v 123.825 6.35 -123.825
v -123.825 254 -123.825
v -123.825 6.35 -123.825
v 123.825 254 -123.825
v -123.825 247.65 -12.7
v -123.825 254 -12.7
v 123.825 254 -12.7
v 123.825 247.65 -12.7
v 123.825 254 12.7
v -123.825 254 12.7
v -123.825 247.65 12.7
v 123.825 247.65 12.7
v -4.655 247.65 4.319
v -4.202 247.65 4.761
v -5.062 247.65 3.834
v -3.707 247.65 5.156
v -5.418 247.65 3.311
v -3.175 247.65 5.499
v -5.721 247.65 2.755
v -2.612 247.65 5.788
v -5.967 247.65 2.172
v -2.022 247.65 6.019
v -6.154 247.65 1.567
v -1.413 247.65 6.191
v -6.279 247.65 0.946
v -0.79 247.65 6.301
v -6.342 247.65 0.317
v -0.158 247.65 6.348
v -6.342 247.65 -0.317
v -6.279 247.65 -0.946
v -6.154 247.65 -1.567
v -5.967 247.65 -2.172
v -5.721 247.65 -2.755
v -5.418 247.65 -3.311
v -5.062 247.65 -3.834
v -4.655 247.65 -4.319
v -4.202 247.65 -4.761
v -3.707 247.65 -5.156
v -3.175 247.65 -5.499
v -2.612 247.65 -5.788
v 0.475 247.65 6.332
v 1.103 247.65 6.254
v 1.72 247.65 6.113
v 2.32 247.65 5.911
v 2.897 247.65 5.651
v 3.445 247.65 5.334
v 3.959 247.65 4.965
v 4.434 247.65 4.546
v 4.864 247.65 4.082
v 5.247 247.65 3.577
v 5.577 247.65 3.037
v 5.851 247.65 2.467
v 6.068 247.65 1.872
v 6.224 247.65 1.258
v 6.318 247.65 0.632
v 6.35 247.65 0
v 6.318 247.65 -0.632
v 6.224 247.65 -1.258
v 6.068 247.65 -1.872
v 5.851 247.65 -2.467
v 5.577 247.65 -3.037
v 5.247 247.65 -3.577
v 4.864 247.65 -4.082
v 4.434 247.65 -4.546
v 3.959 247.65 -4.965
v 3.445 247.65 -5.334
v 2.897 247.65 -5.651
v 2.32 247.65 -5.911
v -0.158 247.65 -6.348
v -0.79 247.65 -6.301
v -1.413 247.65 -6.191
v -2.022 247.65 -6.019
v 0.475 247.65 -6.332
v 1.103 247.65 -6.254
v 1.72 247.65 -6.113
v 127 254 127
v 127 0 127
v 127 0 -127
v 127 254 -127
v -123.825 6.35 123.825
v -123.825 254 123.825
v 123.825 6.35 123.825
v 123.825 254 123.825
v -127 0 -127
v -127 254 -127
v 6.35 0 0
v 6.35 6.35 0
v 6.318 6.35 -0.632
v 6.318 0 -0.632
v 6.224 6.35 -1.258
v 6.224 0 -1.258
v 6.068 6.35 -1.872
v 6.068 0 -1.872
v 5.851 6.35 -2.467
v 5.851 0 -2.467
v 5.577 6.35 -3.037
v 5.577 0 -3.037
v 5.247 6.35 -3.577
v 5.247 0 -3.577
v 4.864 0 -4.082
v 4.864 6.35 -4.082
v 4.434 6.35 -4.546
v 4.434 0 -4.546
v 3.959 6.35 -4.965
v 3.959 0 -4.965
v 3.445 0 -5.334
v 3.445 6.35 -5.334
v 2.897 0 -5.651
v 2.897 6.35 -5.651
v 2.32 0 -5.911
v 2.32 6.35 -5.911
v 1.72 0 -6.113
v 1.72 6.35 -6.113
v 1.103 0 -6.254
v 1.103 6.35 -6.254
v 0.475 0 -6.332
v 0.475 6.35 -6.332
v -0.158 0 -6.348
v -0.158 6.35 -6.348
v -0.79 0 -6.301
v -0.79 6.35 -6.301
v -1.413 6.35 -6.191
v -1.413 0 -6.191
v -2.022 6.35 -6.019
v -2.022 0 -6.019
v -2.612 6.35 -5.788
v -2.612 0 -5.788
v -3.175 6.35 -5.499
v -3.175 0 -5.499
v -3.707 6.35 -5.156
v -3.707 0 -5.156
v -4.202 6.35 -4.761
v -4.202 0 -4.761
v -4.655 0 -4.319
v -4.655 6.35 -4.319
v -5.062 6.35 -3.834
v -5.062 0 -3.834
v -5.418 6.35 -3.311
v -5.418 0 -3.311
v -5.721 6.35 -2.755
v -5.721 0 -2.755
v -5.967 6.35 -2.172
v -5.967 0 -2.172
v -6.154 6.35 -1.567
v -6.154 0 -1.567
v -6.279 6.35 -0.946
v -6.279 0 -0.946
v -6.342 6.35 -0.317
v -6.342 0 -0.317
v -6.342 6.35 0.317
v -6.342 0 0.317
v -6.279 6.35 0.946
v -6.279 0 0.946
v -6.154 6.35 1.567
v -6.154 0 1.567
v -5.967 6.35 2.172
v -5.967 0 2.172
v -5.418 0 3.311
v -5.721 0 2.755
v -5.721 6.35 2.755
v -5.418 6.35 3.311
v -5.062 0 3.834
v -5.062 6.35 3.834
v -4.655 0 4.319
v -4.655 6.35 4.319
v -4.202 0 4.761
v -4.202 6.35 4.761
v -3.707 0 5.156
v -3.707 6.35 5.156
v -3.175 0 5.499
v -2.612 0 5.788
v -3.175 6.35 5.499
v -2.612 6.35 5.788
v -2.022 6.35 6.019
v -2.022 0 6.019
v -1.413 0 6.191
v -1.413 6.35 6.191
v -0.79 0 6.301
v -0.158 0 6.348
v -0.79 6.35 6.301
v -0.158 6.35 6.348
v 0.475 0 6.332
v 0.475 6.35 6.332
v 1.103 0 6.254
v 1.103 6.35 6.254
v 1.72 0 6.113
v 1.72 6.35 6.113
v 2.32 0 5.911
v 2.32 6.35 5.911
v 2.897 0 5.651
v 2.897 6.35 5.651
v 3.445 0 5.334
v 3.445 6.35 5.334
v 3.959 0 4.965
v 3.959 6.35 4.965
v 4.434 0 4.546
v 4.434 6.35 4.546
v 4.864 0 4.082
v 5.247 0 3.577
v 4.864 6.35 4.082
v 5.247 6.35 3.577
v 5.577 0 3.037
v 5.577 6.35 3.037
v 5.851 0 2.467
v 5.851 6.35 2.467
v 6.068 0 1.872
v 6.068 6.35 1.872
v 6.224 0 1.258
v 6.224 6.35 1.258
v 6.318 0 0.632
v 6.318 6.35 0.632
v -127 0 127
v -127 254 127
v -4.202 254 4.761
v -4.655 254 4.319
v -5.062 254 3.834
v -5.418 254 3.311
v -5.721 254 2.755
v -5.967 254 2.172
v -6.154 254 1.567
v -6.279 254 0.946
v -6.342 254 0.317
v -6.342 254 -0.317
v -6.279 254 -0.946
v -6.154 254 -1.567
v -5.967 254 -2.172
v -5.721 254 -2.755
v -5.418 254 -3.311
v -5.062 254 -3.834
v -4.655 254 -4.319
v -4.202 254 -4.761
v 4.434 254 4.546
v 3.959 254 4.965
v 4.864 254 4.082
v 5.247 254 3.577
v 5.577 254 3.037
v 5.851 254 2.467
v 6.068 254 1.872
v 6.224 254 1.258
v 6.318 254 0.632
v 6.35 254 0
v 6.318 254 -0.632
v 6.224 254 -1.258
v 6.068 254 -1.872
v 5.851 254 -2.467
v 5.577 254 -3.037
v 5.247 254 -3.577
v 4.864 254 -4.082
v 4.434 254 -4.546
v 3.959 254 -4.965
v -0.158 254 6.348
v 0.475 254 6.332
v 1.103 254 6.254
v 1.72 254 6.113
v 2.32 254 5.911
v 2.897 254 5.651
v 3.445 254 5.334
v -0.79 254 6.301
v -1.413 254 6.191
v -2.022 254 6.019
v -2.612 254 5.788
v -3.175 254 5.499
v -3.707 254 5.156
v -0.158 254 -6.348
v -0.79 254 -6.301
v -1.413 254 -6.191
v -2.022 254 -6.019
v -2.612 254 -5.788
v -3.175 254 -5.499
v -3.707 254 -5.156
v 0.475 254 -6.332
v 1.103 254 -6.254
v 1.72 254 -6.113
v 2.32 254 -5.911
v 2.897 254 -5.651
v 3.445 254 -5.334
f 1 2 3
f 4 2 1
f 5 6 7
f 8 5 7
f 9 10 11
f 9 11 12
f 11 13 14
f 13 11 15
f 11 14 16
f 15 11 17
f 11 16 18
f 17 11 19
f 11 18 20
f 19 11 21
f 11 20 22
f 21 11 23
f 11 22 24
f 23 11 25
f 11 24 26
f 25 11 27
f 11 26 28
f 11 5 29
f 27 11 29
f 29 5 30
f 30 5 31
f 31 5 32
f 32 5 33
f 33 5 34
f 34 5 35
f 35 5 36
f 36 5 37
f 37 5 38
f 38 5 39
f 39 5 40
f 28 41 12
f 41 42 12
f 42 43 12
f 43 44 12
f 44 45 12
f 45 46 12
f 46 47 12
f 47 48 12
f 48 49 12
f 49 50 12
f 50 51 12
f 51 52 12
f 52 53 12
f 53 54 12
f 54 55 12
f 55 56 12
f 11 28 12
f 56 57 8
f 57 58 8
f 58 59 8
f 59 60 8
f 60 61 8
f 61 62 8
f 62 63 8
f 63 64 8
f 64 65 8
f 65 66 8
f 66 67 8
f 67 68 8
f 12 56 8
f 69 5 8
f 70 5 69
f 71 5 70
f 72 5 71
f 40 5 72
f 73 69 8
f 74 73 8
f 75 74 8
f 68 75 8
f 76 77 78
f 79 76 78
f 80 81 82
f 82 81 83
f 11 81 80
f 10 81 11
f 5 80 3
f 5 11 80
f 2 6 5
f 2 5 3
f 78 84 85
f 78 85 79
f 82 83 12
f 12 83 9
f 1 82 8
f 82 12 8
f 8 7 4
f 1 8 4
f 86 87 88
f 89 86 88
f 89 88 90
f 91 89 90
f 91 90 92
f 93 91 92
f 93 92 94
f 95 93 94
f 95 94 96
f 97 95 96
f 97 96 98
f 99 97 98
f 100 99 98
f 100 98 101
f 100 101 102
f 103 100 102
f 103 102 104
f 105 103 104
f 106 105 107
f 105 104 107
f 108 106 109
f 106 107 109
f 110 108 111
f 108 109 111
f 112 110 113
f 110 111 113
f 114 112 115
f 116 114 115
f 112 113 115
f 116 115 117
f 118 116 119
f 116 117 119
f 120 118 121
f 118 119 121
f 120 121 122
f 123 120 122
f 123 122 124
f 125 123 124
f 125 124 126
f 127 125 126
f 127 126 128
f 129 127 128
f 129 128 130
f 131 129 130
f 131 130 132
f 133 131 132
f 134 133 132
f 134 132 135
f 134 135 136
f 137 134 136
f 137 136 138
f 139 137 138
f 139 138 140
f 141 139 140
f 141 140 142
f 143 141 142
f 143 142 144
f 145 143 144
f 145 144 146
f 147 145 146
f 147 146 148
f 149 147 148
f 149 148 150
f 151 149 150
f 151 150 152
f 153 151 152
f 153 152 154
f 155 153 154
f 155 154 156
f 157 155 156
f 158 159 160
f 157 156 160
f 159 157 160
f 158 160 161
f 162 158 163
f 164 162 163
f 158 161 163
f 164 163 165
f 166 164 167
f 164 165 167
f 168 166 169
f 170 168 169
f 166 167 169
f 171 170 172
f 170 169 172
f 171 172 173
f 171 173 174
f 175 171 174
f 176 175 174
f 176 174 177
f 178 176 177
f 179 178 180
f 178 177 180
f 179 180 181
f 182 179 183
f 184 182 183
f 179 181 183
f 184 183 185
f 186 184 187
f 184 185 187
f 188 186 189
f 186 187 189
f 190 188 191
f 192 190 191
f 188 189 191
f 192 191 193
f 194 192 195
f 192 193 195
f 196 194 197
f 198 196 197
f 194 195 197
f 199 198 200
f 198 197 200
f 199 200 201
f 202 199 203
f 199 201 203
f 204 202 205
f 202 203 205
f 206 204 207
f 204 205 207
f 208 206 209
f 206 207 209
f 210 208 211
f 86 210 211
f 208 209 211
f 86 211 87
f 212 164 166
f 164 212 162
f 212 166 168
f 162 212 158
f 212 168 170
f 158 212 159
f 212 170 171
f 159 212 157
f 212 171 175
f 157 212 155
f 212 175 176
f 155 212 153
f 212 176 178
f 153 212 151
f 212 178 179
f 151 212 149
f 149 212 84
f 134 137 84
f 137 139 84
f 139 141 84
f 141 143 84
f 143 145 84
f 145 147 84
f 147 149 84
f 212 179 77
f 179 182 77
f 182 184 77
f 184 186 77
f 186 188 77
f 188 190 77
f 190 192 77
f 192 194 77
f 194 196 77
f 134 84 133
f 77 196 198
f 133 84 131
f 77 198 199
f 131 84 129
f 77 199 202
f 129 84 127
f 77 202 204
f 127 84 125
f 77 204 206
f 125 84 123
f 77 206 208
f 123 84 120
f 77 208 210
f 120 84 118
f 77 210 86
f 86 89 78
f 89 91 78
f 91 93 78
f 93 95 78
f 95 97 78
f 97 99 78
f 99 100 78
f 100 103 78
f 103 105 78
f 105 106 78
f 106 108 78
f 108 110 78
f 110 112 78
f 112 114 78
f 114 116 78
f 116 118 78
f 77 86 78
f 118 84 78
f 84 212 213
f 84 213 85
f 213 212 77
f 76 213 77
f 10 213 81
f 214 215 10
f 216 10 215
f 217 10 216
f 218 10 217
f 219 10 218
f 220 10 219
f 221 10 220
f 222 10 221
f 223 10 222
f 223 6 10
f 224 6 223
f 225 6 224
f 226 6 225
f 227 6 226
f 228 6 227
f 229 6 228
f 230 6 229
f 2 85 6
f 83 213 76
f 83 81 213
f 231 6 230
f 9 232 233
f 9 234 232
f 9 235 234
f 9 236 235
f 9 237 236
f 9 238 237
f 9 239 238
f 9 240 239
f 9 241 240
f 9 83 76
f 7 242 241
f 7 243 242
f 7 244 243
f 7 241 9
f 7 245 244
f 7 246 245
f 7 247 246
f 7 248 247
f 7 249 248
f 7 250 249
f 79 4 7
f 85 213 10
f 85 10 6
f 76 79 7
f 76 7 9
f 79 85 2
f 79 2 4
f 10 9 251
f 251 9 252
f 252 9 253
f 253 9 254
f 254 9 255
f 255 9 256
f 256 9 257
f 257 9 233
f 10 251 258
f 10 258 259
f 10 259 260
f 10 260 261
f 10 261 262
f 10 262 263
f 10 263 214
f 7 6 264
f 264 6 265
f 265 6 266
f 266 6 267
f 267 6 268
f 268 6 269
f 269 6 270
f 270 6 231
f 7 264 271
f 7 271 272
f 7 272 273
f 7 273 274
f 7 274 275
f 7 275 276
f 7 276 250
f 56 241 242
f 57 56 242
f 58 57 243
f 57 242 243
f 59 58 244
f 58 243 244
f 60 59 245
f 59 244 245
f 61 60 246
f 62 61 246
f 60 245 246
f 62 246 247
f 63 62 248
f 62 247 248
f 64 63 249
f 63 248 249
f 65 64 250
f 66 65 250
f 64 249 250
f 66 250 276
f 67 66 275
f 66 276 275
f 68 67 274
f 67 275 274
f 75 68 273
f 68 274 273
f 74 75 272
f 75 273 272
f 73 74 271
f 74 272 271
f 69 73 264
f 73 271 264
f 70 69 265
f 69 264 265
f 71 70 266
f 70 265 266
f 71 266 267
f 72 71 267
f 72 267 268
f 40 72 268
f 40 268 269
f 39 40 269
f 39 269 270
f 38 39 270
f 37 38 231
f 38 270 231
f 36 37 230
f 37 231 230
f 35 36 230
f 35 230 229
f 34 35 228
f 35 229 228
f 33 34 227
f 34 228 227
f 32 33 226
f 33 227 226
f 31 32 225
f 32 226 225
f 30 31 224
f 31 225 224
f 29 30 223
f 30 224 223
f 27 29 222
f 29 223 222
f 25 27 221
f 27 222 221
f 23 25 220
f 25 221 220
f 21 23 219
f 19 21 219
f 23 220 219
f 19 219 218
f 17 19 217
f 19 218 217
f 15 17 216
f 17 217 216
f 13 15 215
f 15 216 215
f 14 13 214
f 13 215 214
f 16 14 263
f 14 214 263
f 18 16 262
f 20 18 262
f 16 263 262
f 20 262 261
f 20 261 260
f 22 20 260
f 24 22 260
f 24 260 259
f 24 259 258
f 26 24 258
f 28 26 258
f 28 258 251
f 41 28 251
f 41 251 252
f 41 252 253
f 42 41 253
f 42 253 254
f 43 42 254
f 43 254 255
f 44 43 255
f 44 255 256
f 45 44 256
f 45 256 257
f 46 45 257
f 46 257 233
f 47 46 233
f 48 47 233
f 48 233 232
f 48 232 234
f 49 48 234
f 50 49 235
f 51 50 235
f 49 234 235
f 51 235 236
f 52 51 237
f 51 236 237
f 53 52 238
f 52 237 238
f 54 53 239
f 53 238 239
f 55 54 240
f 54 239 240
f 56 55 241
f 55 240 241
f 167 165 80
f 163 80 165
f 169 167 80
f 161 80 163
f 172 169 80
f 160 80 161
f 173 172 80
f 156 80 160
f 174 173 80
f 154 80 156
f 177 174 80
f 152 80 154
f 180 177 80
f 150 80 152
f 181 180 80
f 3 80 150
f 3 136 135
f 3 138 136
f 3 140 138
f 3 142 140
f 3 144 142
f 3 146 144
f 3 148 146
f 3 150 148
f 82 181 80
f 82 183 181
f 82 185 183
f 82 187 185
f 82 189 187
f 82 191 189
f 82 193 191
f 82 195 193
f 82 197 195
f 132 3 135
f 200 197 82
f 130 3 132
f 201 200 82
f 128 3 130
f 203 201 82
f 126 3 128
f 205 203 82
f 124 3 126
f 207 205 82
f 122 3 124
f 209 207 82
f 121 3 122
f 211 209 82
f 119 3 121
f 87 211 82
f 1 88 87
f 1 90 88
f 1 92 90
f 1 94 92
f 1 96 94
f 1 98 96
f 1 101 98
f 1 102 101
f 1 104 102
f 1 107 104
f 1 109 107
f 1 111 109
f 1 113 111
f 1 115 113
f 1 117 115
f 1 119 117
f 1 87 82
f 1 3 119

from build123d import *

# Parameters (mm, degrees)
SKETCH1_W           = 254
SKETCH1_H           = 254
BOSS_EXTRUDE1_DEPTH = 254
SKETCH2_W           = 247.65
SKETCH2_H           = 247.65
CUT_EXTRUDE1_DEPTH  = 247.65
SKETCH3_R           = 6.35
CUT_EXTRUDE2_DEPTH  = 247.65
SKETCH4_W           = 247.65
SKETCH4_H           = 25.4
SKETCH4_R           = 6.35
BOSS_EXTRUDE2_DEPTH = 6.35


with BuildPart() as part:
    # Sketch1 → Boss-Extrude1 (new body)
    with BuildSketch(Plane(origin=(0, 0, 0), x_dir=(1, 0, 0), z_dir=(0, 1, 0))):
        Rectangle(SKETCH1_W, SKETCH1_H)
    extrude(amount=BOSS_EXTRUDE1_DEPTH)

    # Sketch2 → Cut-Extrude1 (cut)
    with BuildSketch(Plane(origin=(0, 254, 0), x_dir=(1, 0, 0), z_dir=(0, 1, 0))):
        Rectangle(SKETCH2_W, SKETCH2_H)
    extrude(amount=-CUT_EXTRUDE1_DEPTH, mode=Mode.SUBTRACT)

    # Sketch3 → Cut-Extrude2 (cut)
    with BuildSketch(Plane(origin=(0, 6.35, 0), x_dir=(1, 0, 0), z_dir=(0, 1, 0))):
        Circle(SKETCH3_R)
    extrude(amount=-CUT_EXTRUDE2_DEPTH, mode=Mode.SUBTRACT)

    # Sketch4 → Boss-Extrude2 (add)
    with BuildSketch(Plane(origin=(0, 254, 0), x_dir=(1, 0, 0), z_dir=(0, 1, 0))):
        Rectangle(SKETCH4_W, SKETCH4_H)
        Circle(SKETCH4_R, mode=Mode.SUBTRACT)
    extrude(amount=-BOSS_EXTRUDE2_DEPTH)


solid = part.part
